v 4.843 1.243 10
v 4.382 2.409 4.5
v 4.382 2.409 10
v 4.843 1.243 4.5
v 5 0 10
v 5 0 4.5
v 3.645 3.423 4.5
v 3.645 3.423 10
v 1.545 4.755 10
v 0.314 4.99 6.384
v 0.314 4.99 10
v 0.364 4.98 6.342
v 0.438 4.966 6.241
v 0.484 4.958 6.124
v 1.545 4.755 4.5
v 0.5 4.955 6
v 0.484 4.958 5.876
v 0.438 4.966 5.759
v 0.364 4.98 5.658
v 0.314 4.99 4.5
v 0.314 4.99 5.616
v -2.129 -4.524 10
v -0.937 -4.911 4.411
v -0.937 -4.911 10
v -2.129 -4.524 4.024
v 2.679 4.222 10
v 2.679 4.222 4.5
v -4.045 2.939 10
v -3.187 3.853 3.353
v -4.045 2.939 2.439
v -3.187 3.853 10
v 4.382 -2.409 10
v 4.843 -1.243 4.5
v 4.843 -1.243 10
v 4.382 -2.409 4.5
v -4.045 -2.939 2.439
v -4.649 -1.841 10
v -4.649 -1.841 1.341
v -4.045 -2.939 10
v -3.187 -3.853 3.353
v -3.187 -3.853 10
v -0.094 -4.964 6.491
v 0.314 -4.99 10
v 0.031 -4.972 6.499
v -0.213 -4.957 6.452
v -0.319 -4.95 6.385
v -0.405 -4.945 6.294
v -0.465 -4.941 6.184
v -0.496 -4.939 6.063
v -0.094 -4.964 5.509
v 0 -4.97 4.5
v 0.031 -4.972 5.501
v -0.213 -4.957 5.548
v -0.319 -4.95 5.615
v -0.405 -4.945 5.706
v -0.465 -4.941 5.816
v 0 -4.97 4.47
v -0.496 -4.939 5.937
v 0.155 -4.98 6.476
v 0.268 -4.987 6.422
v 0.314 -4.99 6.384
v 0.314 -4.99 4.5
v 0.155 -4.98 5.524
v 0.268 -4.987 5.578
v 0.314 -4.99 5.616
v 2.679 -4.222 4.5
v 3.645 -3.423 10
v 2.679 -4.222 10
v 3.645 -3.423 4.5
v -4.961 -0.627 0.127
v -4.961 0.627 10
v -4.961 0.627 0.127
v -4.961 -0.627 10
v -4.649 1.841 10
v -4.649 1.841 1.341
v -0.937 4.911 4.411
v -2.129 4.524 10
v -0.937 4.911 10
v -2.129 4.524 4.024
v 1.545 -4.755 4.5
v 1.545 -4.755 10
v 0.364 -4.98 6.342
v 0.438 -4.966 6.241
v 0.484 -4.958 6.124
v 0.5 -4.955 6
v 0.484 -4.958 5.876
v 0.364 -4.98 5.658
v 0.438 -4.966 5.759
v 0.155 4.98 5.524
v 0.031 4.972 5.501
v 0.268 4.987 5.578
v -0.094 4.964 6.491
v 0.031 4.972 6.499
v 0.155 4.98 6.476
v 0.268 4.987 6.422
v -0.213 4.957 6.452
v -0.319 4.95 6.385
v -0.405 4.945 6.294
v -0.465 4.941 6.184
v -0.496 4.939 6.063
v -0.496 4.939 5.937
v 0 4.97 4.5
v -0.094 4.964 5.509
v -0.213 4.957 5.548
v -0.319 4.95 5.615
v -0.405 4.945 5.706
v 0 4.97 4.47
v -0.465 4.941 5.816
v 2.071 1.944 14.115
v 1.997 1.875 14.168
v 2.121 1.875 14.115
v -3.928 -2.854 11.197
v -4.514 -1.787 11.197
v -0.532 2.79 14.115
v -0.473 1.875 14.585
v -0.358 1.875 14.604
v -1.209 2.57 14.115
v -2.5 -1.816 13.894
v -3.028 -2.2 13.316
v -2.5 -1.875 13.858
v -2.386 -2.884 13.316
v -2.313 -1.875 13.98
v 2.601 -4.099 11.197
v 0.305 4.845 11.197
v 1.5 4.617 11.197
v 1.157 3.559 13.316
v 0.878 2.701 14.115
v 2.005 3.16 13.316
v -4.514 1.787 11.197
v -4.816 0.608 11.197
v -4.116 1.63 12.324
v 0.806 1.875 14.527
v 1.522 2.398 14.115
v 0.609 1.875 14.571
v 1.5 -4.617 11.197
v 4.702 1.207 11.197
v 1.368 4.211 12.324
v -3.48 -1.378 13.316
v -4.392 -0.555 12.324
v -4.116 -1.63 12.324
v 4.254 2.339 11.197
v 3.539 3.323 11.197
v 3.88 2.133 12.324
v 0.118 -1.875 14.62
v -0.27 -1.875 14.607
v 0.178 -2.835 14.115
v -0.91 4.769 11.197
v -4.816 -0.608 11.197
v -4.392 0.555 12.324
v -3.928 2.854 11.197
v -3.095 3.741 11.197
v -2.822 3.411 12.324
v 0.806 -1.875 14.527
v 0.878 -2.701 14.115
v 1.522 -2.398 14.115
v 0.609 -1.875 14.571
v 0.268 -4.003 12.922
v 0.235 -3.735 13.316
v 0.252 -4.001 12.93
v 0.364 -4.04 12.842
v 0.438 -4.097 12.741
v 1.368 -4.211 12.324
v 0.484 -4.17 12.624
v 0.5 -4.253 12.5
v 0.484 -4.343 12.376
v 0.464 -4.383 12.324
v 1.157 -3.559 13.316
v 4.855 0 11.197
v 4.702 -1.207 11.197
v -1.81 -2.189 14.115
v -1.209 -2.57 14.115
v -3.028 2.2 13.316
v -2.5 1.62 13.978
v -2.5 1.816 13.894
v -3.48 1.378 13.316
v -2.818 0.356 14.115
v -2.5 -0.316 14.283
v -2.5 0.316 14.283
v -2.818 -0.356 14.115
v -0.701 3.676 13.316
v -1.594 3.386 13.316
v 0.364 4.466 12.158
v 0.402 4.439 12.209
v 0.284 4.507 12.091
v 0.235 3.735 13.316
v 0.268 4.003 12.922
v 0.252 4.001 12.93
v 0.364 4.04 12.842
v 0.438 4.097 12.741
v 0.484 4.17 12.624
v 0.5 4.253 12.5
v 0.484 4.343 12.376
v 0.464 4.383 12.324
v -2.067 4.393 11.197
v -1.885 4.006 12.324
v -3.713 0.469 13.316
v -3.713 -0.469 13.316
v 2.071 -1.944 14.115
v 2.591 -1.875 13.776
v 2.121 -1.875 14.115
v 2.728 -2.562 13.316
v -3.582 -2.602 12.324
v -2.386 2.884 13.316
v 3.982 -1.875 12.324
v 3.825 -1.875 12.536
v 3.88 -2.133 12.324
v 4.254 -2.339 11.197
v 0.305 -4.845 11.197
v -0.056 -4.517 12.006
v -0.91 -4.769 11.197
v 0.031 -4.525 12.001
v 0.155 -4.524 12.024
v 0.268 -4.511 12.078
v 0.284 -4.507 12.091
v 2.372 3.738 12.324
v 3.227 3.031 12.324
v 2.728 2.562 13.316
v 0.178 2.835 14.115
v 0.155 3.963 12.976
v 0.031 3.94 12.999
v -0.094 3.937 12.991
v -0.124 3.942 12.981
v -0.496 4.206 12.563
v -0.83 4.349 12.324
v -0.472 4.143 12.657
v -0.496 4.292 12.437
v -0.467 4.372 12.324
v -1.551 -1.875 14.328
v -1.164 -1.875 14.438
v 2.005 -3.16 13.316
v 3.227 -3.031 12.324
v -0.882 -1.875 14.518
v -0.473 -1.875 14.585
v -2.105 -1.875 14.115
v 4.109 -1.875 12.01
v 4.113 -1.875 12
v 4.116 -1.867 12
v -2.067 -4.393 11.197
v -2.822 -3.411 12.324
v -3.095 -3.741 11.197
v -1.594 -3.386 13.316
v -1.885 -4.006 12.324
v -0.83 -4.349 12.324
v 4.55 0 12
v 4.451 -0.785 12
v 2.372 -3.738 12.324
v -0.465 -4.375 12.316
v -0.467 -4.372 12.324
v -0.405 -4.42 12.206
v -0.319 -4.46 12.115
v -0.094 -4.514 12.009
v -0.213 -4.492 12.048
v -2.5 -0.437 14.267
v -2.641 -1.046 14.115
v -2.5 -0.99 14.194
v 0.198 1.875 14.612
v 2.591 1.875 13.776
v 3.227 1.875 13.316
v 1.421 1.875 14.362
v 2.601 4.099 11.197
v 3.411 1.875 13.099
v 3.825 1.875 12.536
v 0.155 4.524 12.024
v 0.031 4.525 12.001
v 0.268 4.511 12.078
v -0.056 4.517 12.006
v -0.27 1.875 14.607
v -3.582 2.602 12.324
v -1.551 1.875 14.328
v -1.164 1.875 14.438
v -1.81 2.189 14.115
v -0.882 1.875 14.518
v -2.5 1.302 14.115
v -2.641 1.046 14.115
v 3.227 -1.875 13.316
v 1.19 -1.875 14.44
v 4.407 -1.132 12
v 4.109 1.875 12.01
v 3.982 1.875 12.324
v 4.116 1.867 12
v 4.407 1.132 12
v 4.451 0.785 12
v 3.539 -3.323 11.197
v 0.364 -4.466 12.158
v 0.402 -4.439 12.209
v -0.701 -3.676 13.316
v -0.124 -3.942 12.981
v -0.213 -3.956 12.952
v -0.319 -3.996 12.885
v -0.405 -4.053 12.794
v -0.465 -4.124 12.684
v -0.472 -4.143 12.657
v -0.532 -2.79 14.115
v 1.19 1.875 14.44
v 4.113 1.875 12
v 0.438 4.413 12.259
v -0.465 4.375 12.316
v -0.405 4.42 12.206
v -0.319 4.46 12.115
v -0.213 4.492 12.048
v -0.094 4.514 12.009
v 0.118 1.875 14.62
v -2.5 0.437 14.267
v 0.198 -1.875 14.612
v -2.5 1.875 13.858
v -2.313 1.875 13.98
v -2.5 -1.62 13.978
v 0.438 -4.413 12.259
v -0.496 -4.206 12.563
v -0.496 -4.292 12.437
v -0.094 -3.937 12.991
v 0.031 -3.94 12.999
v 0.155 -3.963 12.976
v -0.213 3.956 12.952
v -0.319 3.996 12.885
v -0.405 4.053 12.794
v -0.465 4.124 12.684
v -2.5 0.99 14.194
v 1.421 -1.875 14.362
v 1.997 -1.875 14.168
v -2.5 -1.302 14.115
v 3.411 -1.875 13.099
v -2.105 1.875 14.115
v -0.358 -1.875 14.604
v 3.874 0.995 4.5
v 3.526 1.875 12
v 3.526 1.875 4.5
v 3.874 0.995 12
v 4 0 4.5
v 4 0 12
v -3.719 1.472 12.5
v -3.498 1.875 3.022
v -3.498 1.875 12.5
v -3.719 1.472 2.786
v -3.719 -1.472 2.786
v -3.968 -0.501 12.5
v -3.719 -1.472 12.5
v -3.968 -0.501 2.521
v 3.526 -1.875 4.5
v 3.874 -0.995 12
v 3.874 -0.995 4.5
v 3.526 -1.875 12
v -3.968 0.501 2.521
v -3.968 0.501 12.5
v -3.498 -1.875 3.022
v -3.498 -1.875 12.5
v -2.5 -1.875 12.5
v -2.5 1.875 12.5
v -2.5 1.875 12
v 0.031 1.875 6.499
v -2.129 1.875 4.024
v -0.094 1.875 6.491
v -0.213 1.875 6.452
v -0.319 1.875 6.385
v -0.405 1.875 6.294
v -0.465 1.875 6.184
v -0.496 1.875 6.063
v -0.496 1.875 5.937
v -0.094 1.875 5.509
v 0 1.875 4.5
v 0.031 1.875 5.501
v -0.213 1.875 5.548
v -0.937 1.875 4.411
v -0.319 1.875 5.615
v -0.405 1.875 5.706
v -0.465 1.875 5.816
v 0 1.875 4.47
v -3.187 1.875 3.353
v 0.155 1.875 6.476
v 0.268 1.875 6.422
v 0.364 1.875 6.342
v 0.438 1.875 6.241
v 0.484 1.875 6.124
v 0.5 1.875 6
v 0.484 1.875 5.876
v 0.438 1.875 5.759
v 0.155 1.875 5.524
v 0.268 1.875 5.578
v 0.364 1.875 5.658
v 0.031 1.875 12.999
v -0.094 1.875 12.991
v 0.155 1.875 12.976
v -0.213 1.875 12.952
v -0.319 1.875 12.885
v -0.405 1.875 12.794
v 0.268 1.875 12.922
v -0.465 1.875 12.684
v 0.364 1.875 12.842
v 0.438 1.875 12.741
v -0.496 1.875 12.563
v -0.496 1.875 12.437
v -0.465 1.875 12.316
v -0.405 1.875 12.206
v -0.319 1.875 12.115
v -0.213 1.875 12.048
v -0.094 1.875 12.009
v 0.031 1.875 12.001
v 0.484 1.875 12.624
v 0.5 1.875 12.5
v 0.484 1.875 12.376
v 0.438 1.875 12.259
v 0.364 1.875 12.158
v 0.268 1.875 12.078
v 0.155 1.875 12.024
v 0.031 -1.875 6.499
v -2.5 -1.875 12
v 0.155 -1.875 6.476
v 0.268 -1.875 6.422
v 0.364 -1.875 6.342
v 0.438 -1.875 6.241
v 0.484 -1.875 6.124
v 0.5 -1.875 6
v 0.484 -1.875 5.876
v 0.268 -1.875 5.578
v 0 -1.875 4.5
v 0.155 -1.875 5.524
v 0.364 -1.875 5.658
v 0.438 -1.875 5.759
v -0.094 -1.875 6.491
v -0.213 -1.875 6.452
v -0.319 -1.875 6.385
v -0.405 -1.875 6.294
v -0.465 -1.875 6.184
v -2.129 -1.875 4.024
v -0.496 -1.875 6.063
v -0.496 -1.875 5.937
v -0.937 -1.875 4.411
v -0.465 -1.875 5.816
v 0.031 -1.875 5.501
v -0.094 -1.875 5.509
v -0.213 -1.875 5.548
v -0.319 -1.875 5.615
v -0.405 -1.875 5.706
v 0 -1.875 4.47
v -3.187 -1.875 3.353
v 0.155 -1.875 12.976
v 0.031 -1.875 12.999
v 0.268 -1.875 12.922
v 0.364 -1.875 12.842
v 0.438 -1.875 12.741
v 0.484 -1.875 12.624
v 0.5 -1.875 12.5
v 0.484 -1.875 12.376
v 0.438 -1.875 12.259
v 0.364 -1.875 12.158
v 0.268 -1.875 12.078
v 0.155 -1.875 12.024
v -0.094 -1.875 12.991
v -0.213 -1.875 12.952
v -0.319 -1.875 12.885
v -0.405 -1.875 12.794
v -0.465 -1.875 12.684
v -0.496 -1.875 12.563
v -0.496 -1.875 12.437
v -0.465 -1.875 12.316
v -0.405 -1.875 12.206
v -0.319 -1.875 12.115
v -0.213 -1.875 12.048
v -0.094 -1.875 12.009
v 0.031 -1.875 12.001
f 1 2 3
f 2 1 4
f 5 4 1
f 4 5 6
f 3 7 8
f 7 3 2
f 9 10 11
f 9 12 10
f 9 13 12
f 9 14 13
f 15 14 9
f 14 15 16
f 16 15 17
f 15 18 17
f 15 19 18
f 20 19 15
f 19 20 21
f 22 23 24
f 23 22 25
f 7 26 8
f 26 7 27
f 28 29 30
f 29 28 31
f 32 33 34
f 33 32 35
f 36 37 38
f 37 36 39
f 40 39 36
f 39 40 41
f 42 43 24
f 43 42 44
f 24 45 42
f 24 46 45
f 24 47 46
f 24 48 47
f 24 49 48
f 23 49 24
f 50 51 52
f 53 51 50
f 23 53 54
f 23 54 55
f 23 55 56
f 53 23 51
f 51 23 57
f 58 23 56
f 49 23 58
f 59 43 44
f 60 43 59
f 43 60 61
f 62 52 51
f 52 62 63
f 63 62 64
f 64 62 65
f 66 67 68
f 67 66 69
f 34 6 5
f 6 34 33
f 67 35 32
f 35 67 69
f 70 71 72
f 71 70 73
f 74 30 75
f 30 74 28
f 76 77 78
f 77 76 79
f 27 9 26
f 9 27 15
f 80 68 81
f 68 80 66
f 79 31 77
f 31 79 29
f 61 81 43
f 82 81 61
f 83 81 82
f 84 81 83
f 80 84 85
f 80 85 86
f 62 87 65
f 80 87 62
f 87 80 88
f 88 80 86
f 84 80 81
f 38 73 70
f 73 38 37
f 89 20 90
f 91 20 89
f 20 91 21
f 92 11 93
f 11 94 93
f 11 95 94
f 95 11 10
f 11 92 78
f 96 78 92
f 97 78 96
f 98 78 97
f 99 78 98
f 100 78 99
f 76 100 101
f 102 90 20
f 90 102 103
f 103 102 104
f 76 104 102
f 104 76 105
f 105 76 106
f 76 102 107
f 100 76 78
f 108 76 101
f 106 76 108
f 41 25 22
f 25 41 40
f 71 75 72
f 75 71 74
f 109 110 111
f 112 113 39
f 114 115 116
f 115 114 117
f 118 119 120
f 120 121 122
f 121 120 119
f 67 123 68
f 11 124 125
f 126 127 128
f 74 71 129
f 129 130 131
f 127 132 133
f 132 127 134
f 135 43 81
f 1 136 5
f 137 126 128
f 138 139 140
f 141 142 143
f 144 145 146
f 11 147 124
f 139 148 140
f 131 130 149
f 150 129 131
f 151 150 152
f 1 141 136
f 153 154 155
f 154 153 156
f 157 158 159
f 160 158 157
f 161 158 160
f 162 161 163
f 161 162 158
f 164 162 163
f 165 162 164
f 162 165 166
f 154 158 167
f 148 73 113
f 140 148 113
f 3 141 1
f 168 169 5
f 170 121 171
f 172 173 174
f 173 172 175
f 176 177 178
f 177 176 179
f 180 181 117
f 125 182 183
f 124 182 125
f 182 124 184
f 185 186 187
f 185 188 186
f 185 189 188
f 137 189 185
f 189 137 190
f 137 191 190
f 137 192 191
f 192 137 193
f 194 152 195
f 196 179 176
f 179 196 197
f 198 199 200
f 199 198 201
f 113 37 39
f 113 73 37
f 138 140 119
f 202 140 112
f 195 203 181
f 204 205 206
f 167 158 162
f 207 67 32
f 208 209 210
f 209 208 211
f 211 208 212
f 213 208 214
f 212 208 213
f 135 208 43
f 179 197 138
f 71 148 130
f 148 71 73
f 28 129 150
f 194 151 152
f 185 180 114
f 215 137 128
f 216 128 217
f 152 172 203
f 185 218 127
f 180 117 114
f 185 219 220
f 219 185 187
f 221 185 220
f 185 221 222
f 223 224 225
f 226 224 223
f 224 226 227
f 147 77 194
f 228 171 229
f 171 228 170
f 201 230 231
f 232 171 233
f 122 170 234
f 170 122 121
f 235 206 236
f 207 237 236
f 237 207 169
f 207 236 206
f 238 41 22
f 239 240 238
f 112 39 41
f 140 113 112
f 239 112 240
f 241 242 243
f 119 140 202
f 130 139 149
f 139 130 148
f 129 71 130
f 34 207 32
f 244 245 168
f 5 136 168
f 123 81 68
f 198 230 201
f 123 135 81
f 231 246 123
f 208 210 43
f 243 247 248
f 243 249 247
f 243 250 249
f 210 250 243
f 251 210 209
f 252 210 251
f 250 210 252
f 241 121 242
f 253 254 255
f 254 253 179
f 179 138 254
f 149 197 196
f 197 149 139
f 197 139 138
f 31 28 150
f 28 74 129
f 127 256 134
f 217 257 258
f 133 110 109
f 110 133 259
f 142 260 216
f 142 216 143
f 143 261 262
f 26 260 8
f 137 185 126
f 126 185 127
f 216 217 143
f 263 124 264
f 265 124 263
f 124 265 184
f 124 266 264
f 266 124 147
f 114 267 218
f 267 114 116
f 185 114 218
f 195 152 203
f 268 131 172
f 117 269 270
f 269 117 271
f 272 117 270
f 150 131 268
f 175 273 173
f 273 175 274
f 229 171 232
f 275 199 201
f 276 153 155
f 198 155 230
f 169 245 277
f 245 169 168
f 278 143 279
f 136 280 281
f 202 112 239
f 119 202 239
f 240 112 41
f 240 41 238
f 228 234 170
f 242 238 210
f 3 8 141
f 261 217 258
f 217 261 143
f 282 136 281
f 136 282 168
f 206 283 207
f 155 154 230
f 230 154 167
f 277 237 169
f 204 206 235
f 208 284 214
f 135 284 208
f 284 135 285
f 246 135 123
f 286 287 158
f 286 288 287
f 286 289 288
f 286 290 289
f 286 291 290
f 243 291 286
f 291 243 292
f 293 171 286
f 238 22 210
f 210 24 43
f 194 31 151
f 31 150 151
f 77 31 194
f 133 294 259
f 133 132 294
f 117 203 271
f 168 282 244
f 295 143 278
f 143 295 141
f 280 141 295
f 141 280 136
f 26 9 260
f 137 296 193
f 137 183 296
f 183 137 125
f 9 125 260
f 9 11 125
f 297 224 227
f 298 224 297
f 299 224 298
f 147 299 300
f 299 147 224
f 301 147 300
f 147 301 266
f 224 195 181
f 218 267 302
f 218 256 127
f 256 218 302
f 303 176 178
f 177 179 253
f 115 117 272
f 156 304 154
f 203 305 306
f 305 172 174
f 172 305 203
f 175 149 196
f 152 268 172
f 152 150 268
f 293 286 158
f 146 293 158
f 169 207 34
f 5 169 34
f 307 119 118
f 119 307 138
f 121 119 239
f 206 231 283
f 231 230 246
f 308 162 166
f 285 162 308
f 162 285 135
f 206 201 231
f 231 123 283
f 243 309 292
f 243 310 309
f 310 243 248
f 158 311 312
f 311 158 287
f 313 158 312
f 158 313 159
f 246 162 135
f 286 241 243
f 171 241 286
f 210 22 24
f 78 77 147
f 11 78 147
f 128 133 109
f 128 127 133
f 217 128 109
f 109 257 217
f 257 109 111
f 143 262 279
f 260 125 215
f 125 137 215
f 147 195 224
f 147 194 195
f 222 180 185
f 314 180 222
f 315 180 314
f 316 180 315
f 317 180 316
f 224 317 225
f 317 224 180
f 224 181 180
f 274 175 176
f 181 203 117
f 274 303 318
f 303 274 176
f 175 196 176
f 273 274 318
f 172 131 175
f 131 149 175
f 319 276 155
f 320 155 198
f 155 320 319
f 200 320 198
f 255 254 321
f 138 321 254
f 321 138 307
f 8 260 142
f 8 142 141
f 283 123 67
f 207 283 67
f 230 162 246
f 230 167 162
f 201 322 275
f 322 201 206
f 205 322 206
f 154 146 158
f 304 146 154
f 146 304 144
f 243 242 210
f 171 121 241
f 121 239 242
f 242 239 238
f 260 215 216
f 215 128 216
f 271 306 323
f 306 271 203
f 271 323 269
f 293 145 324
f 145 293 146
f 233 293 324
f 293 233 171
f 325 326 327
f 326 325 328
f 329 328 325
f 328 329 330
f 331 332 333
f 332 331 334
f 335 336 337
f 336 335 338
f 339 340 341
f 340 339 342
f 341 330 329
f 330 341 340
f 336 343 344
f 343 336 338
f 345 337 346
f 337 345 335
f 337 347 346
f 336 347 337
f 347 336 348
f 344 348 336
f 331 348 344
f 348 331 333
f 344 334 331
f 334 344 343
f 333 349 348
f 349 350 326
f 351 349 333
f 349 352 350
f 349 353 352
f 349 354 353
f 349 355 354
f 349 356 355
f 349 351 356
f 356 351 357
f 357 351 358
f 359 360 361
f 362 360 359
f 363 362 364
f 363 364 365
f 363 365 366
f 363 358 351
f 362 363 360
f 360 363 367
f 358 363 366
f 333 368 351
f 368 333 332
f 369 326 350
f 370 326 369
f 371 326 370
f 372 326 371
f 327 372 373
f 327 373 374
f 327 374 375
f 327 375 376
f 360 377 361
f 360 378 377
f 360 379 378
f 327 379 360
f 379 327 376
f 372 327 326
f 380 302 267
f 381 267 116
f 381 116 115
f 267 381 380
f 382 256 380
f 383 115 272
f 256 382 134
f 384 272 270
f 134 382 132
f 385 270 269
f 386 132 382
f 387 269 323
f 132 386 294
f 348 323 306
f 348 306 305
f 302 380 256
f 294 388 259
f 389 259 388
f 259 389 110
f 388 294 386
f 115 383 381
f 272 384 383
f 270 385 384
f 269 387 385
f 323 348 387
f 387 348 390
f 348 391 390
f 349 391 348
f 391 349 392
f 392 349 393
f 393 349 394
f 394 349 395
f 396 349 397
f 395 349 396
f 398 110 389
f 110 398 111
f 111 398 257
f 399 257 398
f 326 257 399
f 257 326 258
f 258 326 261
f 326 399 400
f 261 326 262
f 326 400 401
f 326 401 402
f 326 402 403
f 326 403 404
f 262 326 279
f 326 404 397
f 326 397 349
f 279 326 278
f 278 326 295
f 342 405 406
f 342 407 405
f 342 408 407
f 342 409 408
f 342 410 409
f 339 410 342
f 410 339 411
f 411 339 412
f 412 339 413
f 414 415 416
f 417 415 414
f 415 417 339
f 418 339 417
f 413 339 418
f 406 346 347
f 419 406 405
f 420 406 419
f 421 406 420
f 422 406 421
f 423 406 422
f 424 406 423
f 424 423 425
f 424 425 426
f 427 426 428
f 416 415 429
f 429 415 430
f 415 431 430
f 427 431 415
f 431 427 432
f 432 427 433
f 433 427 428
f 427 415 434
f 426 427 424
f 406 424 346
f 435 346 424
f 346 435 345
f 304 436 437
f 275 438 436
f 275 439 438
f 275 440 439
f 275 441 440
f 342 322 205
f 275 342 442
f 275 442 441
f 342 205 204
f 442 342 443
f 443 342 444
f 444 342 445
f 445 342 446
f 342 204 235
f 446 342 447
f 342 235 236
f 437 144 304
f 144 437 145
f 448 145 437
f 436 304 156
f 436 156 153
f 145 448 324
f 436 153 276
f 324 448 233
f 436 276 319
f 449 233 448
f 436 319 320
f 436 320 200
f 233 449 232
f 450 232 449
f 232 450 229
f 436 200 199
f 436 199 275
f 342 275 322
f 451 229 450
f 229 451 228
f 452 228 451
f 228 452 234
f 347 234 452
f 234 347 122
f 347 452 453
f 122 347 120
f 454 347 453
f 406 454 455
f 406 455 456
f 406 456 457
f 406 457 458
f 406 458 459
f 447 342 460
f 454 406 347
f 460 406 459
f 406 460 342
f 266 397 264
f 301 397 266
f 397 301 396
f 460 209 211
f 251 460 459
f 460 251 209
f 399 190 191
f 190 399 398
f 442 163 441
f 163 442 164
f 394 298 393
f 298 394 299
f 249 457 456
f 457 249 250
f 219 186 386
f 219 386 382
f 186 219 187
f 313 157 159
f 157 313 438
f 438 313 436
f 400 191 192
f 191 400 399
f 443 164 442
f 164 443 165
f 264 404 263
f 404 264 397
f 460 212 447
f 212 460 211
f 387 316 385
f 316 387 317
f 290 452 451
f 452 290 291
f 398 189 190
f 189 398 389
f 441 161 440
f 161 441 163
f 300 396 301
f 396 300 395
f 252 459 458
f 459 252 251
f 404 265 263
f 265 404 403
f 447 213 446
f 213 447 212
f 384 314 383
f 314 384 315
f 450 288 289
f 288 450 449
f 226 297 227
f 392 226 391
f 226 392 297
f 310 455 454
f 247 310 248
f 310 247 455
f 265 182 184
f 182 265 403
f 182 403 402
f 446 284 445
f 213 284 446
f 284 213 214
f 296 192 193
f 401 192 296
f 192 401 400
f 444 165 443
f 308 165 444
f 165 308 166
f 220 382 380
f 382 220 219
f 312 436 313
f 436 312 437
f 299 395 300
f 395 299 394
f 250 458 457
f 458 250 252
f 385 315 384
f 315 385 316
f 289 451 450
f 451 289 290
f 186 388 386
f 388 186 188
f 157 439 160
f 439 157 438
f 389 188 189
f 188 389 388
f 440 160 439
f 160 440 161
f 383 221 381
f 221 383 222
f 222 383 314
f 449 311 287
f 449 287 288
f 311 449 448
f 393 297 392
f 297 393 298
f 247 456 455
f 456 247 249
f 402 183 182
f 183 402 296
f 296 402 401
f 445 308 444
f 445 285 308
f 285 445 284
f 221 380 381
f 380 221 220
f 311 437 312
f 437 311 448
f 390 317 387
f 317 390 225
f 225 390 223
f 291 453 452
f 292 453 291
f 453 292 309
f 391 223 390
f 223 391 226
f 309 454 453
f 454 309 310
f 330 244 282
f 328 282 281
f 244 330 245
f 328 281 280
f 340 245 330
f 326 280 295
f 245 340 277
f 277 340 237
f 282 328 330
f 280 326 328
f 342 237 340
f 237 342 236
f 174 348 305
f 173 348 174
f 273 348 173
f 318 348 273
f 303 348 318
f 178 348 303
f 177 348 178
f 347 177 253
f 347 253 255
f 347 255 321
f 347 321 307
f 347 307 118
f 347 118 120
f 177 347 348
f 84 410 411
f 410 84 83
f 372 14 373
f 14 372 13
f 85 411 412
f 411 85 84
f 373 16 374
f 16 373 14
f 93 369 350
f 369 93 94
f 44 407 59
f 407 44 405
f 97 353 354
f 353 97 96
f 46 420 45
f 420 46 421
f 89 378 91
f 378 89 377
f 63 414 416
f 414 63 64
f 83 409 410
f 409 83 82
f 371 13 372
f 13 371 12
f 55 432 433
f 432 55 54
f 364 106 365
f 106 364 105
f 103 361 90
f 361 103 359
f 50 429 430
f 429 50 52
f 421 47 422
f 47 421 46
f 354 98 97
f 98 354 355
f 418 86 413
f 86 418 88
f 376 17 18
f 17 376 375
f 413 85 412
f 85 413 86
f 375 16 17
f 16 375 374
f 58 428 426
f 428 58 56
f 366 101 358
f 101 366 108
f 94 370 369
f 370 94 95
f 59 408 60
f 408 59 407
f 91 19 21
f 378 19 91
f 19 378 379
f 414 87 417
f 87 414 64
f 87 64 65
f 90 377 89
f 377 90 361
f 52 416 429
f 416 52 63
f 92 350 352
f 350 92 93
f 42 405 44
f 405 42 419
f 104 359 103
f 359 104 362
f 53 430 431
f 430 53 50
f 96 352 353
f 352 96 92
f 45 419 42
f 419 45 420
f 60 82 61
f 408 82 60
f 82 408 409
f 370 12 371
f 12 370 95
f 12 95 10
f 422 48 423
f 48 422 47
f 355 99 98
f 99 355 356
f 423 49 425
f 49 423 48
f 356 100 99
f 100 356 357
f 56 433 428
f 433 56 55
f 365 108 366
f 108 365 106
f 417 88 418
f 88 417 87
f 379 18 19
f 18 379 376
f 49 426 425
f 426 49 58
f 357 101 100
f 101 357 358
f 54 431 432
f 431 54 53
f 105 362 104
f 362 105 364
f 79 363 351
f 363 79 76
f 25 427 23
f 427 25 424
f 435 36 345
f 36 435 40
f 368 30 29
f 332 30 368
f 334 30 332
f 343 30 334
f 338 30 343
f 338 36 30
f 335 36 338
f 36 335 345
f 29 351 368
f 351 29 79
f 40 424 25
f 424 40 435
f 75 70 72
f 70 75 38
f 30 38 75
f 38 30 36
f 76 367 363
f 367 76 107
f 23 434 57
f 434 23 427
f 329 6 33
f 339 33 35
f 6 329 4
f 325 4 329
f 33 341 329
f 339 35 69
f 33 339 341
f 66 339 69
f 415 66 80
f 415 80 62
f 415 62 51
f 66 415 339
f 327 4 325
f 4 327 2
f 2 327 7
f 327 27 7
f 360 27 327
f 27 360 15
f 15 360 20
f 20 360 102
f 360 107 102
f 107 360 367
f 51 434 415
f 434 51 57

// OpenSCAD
//scale of the full design
SCALE = 0.5;

//open (1) or closed (0) top?
OPEN = 1;

//resolution of the design (~50 MAX)
RESOLUTION =25;

//total height of the design
TOTAL_HEIGHT = 30 * SCALE;

//radius of the design
F_RADIUS = 10 * SCALE;

//height of the cylinder portion
F_HEIGHT = (TOTAL_HEIGHT - F_RADIUS);

//wall thickness
F_THICK = 2 * SCALE;

//internal cylinder joint
C_RADIUS = 5 * SCALE;

//radius of the joint connector hole
H_RADIUS = 1 * SCALE;

difference()
{
  //FINGER SHAPE
  union()
  {
    //FINGER SHAFT
    cylinder(
      //RESOLUTION
      $fn = RESOLUTION,
    
      //HEIGHT
      F_HEIGHT,
    
      //BOTTOM RADIUS
      F_RADIUS,
    
      //TOP RADIUS
      F_RADIUS);
    
    //FINGER TOP
    translate([
      //X-TRANSLATION
      0, 
    
      //Y-TRANSLATION
      0, 
      
      //Z_TRANSLATION
      F_HEIGHT]) //set center of top sphere at the top of the shaft
      
    sphere(
      //RESOLUTION
      $fn = RESOLUTION,
     
      //RADIUS
      F_RADIUS);
  }
  
  //INNER CUTOUT
  difference()
  {
    //CUTOUT SHAPE
    #cylinder(
      //RESOLUTION
      $fn = RESOLUTION,
    
      //HEIGHT
      TOTAL_HEIGHT - F_RADIUS/2, //hollow up to half-way up the top sphere
    
      //BOTTOM RADIUS
      F_RADIUS -  F_THICK, //leave specified wall thickness
    
      //TOP RADIUS
      F_RADIUS - F_THICK); //leave specified wall thickness
    
    //FLAT CUTOUT SIDE 1
    translate([
      //X-TRANSLATION
      -F_RADIUS, //line cutout up with corner of cylinder
      
      //Y-TRANSLATION
      F_RADIUS -(F_RADIUS * 2 - 1.5 * C_RADIUS)/2, //cut out half of connector's length, leaving extra space
     
      //Z-TRANSLATION
       0])
       
    #cube([
      //LENGTH (x-dimension)
      F_RADIUS * 2, //diameter of finger
      
      //WIDTH (y-dimension)
      F_RADIUS, //radius of finger
      
      TOTAL_HEIGHT - F_RADIUS/2]); //bottom to half-way up the top sphere
      
    //FLAT CUTOUT SIDE 2
    translate([
      //X-TRANSLATION
      -F_RADIUS, //line cutout up with corner of cylinder
      
      //Y-TRANSLATION
      -F_RADIUS*2 +(F_RADIUS * 2 - 1.5 * C_RADIUS)/2, //cut out half of connector's length, leaving extra space
     
      //Z-TRANSLATION
      0])
      
    #cube([
      //LENGTH (x-dimension)
      F_RADIUS * 2, //diameter of finger
      
      //WIDTH (y-dimension)
      F_RADIUS, //radius of finger
      
      //HEIGHT (z-dimension)
      TOTAL_HEIGHT - F_RADIUS/2]); //bottom to half-way up the top sphere
  }
  
  
  //BOTTOM CONNECTOR HOLE
  translate([
    //X-TRANSLATION
    0,
      
    //Y-TRANSLATION
    ((F_RADIUS + 2) * 2) / 2, //half of connector hole cutout length
   
    //Z-TRANSLATION
    F_RADIUS + F_THICK  ]) //top of bottom sphere cutout
    
  rotate(
    //ANGLE
    90, //cut the hole sideways, through the cylinder
    
    //AXIS
    [1,0,0]) //x-axis
    
  #cylinder(
    //RESOLUTION
    $fn = RESOLUTION,
    
    //HEIGHT
    (F_RADIUS + 2) * 2, //diameter of finger, with extra length to ensure cutout
    
    //BOTTOM RADIUS
    H_RADIUS, //connector hole radius
    
    //TOP RADIUS
    H_RADIUS); //connector hole radius
  
  if(OPEN)
  {
    //TOP CONNECTOR HOLE
    translate([
      //X-TRANSLATION
      0,
    
      //Y-TRANSLATION
      ((F_RADIUS + 2) * 2) / 2, //half of connector hole cutout length
 
      //Z-TRANSLATION
      TOTAL_HEIGHT - F_RADIUS / 2]) //halfway up the top sphere
  
    rotate(
      //ANGLE
      90, //cut the hole sideways, through the cylinder
 
      //AXIS
      [1,0,0]) //x-axis
  
    #cylinder(
      //RESOLUTION
      $fn = RESOLUTION,
  
      //HEIGHT
      (F_RADIUS + 2) * 2, //diameter of finger, with extra length to ensure cutout
  
      //BOTTOM RADIUS
      H_RADIUS, //connector hole radius
  
      //TOP RADIUS
      H_RADIUS);//connector hole radius
    
    //CONNECTOR CUTOUT
    translate([
      //X-TRANSLATION
      -F_RADIUS / 2, //half of finger radius
    
      //Y-TRANSLATION
      -1.5 * C_RADIUS / 2, //half of cutout length
   
      //Z-TRANSLATION
      TOTAL_HEIGHT - F_RADIUS/2 - H_RADIUS]) //cut down to bottom of top connector hole
    
    #cube([
      //LENGTH (x-axis)
      F_RADIUS * 2, //diameter of finger
    
      //WIDTH (y-axis)
      1.5 * C_RADIUS, //width of connector, with extra space
   
      //HEIGHT
      F_RADIUS]); //radius of finger 
  } 
    
  //BOTTOM CUTOUT  
  translate([
    //X TRANSLATION
    0,
    
    //Y TRANSLATION
    F_RADIUS,
    
    //Z TRANSLATION
    -H_RADIUS])
    
  rotate(
    //ANGLE
    90,
    
    //AXIS
    [1,0,0]) //rotate about the x axis
  #cylinder(
    //RESOLUTION
    $fn = RESOLUTION,
    
    //HEIGHT
    F_RADIUS * 2,
    
    //BOTTOM RADIUS
    F_RADIUS,
   
    //TOP RADIUS
    F_RADIUS);
  
  //FRONT CUTOUT
  translate([
    //X TRANSLATION
    0,
    
    //Y TRANSLATION
    -F_RADIUS, //translate so entire length is cut out
    
    //Z TRANSLATION
    0])
    
  #cube([
  //LENGTH
  F_RADIUS,
  
  //WIDTH
  F_RADIUS * 2,
  
  //HEIGHT
  F_RADIUS - H_RADIUS]);
}
